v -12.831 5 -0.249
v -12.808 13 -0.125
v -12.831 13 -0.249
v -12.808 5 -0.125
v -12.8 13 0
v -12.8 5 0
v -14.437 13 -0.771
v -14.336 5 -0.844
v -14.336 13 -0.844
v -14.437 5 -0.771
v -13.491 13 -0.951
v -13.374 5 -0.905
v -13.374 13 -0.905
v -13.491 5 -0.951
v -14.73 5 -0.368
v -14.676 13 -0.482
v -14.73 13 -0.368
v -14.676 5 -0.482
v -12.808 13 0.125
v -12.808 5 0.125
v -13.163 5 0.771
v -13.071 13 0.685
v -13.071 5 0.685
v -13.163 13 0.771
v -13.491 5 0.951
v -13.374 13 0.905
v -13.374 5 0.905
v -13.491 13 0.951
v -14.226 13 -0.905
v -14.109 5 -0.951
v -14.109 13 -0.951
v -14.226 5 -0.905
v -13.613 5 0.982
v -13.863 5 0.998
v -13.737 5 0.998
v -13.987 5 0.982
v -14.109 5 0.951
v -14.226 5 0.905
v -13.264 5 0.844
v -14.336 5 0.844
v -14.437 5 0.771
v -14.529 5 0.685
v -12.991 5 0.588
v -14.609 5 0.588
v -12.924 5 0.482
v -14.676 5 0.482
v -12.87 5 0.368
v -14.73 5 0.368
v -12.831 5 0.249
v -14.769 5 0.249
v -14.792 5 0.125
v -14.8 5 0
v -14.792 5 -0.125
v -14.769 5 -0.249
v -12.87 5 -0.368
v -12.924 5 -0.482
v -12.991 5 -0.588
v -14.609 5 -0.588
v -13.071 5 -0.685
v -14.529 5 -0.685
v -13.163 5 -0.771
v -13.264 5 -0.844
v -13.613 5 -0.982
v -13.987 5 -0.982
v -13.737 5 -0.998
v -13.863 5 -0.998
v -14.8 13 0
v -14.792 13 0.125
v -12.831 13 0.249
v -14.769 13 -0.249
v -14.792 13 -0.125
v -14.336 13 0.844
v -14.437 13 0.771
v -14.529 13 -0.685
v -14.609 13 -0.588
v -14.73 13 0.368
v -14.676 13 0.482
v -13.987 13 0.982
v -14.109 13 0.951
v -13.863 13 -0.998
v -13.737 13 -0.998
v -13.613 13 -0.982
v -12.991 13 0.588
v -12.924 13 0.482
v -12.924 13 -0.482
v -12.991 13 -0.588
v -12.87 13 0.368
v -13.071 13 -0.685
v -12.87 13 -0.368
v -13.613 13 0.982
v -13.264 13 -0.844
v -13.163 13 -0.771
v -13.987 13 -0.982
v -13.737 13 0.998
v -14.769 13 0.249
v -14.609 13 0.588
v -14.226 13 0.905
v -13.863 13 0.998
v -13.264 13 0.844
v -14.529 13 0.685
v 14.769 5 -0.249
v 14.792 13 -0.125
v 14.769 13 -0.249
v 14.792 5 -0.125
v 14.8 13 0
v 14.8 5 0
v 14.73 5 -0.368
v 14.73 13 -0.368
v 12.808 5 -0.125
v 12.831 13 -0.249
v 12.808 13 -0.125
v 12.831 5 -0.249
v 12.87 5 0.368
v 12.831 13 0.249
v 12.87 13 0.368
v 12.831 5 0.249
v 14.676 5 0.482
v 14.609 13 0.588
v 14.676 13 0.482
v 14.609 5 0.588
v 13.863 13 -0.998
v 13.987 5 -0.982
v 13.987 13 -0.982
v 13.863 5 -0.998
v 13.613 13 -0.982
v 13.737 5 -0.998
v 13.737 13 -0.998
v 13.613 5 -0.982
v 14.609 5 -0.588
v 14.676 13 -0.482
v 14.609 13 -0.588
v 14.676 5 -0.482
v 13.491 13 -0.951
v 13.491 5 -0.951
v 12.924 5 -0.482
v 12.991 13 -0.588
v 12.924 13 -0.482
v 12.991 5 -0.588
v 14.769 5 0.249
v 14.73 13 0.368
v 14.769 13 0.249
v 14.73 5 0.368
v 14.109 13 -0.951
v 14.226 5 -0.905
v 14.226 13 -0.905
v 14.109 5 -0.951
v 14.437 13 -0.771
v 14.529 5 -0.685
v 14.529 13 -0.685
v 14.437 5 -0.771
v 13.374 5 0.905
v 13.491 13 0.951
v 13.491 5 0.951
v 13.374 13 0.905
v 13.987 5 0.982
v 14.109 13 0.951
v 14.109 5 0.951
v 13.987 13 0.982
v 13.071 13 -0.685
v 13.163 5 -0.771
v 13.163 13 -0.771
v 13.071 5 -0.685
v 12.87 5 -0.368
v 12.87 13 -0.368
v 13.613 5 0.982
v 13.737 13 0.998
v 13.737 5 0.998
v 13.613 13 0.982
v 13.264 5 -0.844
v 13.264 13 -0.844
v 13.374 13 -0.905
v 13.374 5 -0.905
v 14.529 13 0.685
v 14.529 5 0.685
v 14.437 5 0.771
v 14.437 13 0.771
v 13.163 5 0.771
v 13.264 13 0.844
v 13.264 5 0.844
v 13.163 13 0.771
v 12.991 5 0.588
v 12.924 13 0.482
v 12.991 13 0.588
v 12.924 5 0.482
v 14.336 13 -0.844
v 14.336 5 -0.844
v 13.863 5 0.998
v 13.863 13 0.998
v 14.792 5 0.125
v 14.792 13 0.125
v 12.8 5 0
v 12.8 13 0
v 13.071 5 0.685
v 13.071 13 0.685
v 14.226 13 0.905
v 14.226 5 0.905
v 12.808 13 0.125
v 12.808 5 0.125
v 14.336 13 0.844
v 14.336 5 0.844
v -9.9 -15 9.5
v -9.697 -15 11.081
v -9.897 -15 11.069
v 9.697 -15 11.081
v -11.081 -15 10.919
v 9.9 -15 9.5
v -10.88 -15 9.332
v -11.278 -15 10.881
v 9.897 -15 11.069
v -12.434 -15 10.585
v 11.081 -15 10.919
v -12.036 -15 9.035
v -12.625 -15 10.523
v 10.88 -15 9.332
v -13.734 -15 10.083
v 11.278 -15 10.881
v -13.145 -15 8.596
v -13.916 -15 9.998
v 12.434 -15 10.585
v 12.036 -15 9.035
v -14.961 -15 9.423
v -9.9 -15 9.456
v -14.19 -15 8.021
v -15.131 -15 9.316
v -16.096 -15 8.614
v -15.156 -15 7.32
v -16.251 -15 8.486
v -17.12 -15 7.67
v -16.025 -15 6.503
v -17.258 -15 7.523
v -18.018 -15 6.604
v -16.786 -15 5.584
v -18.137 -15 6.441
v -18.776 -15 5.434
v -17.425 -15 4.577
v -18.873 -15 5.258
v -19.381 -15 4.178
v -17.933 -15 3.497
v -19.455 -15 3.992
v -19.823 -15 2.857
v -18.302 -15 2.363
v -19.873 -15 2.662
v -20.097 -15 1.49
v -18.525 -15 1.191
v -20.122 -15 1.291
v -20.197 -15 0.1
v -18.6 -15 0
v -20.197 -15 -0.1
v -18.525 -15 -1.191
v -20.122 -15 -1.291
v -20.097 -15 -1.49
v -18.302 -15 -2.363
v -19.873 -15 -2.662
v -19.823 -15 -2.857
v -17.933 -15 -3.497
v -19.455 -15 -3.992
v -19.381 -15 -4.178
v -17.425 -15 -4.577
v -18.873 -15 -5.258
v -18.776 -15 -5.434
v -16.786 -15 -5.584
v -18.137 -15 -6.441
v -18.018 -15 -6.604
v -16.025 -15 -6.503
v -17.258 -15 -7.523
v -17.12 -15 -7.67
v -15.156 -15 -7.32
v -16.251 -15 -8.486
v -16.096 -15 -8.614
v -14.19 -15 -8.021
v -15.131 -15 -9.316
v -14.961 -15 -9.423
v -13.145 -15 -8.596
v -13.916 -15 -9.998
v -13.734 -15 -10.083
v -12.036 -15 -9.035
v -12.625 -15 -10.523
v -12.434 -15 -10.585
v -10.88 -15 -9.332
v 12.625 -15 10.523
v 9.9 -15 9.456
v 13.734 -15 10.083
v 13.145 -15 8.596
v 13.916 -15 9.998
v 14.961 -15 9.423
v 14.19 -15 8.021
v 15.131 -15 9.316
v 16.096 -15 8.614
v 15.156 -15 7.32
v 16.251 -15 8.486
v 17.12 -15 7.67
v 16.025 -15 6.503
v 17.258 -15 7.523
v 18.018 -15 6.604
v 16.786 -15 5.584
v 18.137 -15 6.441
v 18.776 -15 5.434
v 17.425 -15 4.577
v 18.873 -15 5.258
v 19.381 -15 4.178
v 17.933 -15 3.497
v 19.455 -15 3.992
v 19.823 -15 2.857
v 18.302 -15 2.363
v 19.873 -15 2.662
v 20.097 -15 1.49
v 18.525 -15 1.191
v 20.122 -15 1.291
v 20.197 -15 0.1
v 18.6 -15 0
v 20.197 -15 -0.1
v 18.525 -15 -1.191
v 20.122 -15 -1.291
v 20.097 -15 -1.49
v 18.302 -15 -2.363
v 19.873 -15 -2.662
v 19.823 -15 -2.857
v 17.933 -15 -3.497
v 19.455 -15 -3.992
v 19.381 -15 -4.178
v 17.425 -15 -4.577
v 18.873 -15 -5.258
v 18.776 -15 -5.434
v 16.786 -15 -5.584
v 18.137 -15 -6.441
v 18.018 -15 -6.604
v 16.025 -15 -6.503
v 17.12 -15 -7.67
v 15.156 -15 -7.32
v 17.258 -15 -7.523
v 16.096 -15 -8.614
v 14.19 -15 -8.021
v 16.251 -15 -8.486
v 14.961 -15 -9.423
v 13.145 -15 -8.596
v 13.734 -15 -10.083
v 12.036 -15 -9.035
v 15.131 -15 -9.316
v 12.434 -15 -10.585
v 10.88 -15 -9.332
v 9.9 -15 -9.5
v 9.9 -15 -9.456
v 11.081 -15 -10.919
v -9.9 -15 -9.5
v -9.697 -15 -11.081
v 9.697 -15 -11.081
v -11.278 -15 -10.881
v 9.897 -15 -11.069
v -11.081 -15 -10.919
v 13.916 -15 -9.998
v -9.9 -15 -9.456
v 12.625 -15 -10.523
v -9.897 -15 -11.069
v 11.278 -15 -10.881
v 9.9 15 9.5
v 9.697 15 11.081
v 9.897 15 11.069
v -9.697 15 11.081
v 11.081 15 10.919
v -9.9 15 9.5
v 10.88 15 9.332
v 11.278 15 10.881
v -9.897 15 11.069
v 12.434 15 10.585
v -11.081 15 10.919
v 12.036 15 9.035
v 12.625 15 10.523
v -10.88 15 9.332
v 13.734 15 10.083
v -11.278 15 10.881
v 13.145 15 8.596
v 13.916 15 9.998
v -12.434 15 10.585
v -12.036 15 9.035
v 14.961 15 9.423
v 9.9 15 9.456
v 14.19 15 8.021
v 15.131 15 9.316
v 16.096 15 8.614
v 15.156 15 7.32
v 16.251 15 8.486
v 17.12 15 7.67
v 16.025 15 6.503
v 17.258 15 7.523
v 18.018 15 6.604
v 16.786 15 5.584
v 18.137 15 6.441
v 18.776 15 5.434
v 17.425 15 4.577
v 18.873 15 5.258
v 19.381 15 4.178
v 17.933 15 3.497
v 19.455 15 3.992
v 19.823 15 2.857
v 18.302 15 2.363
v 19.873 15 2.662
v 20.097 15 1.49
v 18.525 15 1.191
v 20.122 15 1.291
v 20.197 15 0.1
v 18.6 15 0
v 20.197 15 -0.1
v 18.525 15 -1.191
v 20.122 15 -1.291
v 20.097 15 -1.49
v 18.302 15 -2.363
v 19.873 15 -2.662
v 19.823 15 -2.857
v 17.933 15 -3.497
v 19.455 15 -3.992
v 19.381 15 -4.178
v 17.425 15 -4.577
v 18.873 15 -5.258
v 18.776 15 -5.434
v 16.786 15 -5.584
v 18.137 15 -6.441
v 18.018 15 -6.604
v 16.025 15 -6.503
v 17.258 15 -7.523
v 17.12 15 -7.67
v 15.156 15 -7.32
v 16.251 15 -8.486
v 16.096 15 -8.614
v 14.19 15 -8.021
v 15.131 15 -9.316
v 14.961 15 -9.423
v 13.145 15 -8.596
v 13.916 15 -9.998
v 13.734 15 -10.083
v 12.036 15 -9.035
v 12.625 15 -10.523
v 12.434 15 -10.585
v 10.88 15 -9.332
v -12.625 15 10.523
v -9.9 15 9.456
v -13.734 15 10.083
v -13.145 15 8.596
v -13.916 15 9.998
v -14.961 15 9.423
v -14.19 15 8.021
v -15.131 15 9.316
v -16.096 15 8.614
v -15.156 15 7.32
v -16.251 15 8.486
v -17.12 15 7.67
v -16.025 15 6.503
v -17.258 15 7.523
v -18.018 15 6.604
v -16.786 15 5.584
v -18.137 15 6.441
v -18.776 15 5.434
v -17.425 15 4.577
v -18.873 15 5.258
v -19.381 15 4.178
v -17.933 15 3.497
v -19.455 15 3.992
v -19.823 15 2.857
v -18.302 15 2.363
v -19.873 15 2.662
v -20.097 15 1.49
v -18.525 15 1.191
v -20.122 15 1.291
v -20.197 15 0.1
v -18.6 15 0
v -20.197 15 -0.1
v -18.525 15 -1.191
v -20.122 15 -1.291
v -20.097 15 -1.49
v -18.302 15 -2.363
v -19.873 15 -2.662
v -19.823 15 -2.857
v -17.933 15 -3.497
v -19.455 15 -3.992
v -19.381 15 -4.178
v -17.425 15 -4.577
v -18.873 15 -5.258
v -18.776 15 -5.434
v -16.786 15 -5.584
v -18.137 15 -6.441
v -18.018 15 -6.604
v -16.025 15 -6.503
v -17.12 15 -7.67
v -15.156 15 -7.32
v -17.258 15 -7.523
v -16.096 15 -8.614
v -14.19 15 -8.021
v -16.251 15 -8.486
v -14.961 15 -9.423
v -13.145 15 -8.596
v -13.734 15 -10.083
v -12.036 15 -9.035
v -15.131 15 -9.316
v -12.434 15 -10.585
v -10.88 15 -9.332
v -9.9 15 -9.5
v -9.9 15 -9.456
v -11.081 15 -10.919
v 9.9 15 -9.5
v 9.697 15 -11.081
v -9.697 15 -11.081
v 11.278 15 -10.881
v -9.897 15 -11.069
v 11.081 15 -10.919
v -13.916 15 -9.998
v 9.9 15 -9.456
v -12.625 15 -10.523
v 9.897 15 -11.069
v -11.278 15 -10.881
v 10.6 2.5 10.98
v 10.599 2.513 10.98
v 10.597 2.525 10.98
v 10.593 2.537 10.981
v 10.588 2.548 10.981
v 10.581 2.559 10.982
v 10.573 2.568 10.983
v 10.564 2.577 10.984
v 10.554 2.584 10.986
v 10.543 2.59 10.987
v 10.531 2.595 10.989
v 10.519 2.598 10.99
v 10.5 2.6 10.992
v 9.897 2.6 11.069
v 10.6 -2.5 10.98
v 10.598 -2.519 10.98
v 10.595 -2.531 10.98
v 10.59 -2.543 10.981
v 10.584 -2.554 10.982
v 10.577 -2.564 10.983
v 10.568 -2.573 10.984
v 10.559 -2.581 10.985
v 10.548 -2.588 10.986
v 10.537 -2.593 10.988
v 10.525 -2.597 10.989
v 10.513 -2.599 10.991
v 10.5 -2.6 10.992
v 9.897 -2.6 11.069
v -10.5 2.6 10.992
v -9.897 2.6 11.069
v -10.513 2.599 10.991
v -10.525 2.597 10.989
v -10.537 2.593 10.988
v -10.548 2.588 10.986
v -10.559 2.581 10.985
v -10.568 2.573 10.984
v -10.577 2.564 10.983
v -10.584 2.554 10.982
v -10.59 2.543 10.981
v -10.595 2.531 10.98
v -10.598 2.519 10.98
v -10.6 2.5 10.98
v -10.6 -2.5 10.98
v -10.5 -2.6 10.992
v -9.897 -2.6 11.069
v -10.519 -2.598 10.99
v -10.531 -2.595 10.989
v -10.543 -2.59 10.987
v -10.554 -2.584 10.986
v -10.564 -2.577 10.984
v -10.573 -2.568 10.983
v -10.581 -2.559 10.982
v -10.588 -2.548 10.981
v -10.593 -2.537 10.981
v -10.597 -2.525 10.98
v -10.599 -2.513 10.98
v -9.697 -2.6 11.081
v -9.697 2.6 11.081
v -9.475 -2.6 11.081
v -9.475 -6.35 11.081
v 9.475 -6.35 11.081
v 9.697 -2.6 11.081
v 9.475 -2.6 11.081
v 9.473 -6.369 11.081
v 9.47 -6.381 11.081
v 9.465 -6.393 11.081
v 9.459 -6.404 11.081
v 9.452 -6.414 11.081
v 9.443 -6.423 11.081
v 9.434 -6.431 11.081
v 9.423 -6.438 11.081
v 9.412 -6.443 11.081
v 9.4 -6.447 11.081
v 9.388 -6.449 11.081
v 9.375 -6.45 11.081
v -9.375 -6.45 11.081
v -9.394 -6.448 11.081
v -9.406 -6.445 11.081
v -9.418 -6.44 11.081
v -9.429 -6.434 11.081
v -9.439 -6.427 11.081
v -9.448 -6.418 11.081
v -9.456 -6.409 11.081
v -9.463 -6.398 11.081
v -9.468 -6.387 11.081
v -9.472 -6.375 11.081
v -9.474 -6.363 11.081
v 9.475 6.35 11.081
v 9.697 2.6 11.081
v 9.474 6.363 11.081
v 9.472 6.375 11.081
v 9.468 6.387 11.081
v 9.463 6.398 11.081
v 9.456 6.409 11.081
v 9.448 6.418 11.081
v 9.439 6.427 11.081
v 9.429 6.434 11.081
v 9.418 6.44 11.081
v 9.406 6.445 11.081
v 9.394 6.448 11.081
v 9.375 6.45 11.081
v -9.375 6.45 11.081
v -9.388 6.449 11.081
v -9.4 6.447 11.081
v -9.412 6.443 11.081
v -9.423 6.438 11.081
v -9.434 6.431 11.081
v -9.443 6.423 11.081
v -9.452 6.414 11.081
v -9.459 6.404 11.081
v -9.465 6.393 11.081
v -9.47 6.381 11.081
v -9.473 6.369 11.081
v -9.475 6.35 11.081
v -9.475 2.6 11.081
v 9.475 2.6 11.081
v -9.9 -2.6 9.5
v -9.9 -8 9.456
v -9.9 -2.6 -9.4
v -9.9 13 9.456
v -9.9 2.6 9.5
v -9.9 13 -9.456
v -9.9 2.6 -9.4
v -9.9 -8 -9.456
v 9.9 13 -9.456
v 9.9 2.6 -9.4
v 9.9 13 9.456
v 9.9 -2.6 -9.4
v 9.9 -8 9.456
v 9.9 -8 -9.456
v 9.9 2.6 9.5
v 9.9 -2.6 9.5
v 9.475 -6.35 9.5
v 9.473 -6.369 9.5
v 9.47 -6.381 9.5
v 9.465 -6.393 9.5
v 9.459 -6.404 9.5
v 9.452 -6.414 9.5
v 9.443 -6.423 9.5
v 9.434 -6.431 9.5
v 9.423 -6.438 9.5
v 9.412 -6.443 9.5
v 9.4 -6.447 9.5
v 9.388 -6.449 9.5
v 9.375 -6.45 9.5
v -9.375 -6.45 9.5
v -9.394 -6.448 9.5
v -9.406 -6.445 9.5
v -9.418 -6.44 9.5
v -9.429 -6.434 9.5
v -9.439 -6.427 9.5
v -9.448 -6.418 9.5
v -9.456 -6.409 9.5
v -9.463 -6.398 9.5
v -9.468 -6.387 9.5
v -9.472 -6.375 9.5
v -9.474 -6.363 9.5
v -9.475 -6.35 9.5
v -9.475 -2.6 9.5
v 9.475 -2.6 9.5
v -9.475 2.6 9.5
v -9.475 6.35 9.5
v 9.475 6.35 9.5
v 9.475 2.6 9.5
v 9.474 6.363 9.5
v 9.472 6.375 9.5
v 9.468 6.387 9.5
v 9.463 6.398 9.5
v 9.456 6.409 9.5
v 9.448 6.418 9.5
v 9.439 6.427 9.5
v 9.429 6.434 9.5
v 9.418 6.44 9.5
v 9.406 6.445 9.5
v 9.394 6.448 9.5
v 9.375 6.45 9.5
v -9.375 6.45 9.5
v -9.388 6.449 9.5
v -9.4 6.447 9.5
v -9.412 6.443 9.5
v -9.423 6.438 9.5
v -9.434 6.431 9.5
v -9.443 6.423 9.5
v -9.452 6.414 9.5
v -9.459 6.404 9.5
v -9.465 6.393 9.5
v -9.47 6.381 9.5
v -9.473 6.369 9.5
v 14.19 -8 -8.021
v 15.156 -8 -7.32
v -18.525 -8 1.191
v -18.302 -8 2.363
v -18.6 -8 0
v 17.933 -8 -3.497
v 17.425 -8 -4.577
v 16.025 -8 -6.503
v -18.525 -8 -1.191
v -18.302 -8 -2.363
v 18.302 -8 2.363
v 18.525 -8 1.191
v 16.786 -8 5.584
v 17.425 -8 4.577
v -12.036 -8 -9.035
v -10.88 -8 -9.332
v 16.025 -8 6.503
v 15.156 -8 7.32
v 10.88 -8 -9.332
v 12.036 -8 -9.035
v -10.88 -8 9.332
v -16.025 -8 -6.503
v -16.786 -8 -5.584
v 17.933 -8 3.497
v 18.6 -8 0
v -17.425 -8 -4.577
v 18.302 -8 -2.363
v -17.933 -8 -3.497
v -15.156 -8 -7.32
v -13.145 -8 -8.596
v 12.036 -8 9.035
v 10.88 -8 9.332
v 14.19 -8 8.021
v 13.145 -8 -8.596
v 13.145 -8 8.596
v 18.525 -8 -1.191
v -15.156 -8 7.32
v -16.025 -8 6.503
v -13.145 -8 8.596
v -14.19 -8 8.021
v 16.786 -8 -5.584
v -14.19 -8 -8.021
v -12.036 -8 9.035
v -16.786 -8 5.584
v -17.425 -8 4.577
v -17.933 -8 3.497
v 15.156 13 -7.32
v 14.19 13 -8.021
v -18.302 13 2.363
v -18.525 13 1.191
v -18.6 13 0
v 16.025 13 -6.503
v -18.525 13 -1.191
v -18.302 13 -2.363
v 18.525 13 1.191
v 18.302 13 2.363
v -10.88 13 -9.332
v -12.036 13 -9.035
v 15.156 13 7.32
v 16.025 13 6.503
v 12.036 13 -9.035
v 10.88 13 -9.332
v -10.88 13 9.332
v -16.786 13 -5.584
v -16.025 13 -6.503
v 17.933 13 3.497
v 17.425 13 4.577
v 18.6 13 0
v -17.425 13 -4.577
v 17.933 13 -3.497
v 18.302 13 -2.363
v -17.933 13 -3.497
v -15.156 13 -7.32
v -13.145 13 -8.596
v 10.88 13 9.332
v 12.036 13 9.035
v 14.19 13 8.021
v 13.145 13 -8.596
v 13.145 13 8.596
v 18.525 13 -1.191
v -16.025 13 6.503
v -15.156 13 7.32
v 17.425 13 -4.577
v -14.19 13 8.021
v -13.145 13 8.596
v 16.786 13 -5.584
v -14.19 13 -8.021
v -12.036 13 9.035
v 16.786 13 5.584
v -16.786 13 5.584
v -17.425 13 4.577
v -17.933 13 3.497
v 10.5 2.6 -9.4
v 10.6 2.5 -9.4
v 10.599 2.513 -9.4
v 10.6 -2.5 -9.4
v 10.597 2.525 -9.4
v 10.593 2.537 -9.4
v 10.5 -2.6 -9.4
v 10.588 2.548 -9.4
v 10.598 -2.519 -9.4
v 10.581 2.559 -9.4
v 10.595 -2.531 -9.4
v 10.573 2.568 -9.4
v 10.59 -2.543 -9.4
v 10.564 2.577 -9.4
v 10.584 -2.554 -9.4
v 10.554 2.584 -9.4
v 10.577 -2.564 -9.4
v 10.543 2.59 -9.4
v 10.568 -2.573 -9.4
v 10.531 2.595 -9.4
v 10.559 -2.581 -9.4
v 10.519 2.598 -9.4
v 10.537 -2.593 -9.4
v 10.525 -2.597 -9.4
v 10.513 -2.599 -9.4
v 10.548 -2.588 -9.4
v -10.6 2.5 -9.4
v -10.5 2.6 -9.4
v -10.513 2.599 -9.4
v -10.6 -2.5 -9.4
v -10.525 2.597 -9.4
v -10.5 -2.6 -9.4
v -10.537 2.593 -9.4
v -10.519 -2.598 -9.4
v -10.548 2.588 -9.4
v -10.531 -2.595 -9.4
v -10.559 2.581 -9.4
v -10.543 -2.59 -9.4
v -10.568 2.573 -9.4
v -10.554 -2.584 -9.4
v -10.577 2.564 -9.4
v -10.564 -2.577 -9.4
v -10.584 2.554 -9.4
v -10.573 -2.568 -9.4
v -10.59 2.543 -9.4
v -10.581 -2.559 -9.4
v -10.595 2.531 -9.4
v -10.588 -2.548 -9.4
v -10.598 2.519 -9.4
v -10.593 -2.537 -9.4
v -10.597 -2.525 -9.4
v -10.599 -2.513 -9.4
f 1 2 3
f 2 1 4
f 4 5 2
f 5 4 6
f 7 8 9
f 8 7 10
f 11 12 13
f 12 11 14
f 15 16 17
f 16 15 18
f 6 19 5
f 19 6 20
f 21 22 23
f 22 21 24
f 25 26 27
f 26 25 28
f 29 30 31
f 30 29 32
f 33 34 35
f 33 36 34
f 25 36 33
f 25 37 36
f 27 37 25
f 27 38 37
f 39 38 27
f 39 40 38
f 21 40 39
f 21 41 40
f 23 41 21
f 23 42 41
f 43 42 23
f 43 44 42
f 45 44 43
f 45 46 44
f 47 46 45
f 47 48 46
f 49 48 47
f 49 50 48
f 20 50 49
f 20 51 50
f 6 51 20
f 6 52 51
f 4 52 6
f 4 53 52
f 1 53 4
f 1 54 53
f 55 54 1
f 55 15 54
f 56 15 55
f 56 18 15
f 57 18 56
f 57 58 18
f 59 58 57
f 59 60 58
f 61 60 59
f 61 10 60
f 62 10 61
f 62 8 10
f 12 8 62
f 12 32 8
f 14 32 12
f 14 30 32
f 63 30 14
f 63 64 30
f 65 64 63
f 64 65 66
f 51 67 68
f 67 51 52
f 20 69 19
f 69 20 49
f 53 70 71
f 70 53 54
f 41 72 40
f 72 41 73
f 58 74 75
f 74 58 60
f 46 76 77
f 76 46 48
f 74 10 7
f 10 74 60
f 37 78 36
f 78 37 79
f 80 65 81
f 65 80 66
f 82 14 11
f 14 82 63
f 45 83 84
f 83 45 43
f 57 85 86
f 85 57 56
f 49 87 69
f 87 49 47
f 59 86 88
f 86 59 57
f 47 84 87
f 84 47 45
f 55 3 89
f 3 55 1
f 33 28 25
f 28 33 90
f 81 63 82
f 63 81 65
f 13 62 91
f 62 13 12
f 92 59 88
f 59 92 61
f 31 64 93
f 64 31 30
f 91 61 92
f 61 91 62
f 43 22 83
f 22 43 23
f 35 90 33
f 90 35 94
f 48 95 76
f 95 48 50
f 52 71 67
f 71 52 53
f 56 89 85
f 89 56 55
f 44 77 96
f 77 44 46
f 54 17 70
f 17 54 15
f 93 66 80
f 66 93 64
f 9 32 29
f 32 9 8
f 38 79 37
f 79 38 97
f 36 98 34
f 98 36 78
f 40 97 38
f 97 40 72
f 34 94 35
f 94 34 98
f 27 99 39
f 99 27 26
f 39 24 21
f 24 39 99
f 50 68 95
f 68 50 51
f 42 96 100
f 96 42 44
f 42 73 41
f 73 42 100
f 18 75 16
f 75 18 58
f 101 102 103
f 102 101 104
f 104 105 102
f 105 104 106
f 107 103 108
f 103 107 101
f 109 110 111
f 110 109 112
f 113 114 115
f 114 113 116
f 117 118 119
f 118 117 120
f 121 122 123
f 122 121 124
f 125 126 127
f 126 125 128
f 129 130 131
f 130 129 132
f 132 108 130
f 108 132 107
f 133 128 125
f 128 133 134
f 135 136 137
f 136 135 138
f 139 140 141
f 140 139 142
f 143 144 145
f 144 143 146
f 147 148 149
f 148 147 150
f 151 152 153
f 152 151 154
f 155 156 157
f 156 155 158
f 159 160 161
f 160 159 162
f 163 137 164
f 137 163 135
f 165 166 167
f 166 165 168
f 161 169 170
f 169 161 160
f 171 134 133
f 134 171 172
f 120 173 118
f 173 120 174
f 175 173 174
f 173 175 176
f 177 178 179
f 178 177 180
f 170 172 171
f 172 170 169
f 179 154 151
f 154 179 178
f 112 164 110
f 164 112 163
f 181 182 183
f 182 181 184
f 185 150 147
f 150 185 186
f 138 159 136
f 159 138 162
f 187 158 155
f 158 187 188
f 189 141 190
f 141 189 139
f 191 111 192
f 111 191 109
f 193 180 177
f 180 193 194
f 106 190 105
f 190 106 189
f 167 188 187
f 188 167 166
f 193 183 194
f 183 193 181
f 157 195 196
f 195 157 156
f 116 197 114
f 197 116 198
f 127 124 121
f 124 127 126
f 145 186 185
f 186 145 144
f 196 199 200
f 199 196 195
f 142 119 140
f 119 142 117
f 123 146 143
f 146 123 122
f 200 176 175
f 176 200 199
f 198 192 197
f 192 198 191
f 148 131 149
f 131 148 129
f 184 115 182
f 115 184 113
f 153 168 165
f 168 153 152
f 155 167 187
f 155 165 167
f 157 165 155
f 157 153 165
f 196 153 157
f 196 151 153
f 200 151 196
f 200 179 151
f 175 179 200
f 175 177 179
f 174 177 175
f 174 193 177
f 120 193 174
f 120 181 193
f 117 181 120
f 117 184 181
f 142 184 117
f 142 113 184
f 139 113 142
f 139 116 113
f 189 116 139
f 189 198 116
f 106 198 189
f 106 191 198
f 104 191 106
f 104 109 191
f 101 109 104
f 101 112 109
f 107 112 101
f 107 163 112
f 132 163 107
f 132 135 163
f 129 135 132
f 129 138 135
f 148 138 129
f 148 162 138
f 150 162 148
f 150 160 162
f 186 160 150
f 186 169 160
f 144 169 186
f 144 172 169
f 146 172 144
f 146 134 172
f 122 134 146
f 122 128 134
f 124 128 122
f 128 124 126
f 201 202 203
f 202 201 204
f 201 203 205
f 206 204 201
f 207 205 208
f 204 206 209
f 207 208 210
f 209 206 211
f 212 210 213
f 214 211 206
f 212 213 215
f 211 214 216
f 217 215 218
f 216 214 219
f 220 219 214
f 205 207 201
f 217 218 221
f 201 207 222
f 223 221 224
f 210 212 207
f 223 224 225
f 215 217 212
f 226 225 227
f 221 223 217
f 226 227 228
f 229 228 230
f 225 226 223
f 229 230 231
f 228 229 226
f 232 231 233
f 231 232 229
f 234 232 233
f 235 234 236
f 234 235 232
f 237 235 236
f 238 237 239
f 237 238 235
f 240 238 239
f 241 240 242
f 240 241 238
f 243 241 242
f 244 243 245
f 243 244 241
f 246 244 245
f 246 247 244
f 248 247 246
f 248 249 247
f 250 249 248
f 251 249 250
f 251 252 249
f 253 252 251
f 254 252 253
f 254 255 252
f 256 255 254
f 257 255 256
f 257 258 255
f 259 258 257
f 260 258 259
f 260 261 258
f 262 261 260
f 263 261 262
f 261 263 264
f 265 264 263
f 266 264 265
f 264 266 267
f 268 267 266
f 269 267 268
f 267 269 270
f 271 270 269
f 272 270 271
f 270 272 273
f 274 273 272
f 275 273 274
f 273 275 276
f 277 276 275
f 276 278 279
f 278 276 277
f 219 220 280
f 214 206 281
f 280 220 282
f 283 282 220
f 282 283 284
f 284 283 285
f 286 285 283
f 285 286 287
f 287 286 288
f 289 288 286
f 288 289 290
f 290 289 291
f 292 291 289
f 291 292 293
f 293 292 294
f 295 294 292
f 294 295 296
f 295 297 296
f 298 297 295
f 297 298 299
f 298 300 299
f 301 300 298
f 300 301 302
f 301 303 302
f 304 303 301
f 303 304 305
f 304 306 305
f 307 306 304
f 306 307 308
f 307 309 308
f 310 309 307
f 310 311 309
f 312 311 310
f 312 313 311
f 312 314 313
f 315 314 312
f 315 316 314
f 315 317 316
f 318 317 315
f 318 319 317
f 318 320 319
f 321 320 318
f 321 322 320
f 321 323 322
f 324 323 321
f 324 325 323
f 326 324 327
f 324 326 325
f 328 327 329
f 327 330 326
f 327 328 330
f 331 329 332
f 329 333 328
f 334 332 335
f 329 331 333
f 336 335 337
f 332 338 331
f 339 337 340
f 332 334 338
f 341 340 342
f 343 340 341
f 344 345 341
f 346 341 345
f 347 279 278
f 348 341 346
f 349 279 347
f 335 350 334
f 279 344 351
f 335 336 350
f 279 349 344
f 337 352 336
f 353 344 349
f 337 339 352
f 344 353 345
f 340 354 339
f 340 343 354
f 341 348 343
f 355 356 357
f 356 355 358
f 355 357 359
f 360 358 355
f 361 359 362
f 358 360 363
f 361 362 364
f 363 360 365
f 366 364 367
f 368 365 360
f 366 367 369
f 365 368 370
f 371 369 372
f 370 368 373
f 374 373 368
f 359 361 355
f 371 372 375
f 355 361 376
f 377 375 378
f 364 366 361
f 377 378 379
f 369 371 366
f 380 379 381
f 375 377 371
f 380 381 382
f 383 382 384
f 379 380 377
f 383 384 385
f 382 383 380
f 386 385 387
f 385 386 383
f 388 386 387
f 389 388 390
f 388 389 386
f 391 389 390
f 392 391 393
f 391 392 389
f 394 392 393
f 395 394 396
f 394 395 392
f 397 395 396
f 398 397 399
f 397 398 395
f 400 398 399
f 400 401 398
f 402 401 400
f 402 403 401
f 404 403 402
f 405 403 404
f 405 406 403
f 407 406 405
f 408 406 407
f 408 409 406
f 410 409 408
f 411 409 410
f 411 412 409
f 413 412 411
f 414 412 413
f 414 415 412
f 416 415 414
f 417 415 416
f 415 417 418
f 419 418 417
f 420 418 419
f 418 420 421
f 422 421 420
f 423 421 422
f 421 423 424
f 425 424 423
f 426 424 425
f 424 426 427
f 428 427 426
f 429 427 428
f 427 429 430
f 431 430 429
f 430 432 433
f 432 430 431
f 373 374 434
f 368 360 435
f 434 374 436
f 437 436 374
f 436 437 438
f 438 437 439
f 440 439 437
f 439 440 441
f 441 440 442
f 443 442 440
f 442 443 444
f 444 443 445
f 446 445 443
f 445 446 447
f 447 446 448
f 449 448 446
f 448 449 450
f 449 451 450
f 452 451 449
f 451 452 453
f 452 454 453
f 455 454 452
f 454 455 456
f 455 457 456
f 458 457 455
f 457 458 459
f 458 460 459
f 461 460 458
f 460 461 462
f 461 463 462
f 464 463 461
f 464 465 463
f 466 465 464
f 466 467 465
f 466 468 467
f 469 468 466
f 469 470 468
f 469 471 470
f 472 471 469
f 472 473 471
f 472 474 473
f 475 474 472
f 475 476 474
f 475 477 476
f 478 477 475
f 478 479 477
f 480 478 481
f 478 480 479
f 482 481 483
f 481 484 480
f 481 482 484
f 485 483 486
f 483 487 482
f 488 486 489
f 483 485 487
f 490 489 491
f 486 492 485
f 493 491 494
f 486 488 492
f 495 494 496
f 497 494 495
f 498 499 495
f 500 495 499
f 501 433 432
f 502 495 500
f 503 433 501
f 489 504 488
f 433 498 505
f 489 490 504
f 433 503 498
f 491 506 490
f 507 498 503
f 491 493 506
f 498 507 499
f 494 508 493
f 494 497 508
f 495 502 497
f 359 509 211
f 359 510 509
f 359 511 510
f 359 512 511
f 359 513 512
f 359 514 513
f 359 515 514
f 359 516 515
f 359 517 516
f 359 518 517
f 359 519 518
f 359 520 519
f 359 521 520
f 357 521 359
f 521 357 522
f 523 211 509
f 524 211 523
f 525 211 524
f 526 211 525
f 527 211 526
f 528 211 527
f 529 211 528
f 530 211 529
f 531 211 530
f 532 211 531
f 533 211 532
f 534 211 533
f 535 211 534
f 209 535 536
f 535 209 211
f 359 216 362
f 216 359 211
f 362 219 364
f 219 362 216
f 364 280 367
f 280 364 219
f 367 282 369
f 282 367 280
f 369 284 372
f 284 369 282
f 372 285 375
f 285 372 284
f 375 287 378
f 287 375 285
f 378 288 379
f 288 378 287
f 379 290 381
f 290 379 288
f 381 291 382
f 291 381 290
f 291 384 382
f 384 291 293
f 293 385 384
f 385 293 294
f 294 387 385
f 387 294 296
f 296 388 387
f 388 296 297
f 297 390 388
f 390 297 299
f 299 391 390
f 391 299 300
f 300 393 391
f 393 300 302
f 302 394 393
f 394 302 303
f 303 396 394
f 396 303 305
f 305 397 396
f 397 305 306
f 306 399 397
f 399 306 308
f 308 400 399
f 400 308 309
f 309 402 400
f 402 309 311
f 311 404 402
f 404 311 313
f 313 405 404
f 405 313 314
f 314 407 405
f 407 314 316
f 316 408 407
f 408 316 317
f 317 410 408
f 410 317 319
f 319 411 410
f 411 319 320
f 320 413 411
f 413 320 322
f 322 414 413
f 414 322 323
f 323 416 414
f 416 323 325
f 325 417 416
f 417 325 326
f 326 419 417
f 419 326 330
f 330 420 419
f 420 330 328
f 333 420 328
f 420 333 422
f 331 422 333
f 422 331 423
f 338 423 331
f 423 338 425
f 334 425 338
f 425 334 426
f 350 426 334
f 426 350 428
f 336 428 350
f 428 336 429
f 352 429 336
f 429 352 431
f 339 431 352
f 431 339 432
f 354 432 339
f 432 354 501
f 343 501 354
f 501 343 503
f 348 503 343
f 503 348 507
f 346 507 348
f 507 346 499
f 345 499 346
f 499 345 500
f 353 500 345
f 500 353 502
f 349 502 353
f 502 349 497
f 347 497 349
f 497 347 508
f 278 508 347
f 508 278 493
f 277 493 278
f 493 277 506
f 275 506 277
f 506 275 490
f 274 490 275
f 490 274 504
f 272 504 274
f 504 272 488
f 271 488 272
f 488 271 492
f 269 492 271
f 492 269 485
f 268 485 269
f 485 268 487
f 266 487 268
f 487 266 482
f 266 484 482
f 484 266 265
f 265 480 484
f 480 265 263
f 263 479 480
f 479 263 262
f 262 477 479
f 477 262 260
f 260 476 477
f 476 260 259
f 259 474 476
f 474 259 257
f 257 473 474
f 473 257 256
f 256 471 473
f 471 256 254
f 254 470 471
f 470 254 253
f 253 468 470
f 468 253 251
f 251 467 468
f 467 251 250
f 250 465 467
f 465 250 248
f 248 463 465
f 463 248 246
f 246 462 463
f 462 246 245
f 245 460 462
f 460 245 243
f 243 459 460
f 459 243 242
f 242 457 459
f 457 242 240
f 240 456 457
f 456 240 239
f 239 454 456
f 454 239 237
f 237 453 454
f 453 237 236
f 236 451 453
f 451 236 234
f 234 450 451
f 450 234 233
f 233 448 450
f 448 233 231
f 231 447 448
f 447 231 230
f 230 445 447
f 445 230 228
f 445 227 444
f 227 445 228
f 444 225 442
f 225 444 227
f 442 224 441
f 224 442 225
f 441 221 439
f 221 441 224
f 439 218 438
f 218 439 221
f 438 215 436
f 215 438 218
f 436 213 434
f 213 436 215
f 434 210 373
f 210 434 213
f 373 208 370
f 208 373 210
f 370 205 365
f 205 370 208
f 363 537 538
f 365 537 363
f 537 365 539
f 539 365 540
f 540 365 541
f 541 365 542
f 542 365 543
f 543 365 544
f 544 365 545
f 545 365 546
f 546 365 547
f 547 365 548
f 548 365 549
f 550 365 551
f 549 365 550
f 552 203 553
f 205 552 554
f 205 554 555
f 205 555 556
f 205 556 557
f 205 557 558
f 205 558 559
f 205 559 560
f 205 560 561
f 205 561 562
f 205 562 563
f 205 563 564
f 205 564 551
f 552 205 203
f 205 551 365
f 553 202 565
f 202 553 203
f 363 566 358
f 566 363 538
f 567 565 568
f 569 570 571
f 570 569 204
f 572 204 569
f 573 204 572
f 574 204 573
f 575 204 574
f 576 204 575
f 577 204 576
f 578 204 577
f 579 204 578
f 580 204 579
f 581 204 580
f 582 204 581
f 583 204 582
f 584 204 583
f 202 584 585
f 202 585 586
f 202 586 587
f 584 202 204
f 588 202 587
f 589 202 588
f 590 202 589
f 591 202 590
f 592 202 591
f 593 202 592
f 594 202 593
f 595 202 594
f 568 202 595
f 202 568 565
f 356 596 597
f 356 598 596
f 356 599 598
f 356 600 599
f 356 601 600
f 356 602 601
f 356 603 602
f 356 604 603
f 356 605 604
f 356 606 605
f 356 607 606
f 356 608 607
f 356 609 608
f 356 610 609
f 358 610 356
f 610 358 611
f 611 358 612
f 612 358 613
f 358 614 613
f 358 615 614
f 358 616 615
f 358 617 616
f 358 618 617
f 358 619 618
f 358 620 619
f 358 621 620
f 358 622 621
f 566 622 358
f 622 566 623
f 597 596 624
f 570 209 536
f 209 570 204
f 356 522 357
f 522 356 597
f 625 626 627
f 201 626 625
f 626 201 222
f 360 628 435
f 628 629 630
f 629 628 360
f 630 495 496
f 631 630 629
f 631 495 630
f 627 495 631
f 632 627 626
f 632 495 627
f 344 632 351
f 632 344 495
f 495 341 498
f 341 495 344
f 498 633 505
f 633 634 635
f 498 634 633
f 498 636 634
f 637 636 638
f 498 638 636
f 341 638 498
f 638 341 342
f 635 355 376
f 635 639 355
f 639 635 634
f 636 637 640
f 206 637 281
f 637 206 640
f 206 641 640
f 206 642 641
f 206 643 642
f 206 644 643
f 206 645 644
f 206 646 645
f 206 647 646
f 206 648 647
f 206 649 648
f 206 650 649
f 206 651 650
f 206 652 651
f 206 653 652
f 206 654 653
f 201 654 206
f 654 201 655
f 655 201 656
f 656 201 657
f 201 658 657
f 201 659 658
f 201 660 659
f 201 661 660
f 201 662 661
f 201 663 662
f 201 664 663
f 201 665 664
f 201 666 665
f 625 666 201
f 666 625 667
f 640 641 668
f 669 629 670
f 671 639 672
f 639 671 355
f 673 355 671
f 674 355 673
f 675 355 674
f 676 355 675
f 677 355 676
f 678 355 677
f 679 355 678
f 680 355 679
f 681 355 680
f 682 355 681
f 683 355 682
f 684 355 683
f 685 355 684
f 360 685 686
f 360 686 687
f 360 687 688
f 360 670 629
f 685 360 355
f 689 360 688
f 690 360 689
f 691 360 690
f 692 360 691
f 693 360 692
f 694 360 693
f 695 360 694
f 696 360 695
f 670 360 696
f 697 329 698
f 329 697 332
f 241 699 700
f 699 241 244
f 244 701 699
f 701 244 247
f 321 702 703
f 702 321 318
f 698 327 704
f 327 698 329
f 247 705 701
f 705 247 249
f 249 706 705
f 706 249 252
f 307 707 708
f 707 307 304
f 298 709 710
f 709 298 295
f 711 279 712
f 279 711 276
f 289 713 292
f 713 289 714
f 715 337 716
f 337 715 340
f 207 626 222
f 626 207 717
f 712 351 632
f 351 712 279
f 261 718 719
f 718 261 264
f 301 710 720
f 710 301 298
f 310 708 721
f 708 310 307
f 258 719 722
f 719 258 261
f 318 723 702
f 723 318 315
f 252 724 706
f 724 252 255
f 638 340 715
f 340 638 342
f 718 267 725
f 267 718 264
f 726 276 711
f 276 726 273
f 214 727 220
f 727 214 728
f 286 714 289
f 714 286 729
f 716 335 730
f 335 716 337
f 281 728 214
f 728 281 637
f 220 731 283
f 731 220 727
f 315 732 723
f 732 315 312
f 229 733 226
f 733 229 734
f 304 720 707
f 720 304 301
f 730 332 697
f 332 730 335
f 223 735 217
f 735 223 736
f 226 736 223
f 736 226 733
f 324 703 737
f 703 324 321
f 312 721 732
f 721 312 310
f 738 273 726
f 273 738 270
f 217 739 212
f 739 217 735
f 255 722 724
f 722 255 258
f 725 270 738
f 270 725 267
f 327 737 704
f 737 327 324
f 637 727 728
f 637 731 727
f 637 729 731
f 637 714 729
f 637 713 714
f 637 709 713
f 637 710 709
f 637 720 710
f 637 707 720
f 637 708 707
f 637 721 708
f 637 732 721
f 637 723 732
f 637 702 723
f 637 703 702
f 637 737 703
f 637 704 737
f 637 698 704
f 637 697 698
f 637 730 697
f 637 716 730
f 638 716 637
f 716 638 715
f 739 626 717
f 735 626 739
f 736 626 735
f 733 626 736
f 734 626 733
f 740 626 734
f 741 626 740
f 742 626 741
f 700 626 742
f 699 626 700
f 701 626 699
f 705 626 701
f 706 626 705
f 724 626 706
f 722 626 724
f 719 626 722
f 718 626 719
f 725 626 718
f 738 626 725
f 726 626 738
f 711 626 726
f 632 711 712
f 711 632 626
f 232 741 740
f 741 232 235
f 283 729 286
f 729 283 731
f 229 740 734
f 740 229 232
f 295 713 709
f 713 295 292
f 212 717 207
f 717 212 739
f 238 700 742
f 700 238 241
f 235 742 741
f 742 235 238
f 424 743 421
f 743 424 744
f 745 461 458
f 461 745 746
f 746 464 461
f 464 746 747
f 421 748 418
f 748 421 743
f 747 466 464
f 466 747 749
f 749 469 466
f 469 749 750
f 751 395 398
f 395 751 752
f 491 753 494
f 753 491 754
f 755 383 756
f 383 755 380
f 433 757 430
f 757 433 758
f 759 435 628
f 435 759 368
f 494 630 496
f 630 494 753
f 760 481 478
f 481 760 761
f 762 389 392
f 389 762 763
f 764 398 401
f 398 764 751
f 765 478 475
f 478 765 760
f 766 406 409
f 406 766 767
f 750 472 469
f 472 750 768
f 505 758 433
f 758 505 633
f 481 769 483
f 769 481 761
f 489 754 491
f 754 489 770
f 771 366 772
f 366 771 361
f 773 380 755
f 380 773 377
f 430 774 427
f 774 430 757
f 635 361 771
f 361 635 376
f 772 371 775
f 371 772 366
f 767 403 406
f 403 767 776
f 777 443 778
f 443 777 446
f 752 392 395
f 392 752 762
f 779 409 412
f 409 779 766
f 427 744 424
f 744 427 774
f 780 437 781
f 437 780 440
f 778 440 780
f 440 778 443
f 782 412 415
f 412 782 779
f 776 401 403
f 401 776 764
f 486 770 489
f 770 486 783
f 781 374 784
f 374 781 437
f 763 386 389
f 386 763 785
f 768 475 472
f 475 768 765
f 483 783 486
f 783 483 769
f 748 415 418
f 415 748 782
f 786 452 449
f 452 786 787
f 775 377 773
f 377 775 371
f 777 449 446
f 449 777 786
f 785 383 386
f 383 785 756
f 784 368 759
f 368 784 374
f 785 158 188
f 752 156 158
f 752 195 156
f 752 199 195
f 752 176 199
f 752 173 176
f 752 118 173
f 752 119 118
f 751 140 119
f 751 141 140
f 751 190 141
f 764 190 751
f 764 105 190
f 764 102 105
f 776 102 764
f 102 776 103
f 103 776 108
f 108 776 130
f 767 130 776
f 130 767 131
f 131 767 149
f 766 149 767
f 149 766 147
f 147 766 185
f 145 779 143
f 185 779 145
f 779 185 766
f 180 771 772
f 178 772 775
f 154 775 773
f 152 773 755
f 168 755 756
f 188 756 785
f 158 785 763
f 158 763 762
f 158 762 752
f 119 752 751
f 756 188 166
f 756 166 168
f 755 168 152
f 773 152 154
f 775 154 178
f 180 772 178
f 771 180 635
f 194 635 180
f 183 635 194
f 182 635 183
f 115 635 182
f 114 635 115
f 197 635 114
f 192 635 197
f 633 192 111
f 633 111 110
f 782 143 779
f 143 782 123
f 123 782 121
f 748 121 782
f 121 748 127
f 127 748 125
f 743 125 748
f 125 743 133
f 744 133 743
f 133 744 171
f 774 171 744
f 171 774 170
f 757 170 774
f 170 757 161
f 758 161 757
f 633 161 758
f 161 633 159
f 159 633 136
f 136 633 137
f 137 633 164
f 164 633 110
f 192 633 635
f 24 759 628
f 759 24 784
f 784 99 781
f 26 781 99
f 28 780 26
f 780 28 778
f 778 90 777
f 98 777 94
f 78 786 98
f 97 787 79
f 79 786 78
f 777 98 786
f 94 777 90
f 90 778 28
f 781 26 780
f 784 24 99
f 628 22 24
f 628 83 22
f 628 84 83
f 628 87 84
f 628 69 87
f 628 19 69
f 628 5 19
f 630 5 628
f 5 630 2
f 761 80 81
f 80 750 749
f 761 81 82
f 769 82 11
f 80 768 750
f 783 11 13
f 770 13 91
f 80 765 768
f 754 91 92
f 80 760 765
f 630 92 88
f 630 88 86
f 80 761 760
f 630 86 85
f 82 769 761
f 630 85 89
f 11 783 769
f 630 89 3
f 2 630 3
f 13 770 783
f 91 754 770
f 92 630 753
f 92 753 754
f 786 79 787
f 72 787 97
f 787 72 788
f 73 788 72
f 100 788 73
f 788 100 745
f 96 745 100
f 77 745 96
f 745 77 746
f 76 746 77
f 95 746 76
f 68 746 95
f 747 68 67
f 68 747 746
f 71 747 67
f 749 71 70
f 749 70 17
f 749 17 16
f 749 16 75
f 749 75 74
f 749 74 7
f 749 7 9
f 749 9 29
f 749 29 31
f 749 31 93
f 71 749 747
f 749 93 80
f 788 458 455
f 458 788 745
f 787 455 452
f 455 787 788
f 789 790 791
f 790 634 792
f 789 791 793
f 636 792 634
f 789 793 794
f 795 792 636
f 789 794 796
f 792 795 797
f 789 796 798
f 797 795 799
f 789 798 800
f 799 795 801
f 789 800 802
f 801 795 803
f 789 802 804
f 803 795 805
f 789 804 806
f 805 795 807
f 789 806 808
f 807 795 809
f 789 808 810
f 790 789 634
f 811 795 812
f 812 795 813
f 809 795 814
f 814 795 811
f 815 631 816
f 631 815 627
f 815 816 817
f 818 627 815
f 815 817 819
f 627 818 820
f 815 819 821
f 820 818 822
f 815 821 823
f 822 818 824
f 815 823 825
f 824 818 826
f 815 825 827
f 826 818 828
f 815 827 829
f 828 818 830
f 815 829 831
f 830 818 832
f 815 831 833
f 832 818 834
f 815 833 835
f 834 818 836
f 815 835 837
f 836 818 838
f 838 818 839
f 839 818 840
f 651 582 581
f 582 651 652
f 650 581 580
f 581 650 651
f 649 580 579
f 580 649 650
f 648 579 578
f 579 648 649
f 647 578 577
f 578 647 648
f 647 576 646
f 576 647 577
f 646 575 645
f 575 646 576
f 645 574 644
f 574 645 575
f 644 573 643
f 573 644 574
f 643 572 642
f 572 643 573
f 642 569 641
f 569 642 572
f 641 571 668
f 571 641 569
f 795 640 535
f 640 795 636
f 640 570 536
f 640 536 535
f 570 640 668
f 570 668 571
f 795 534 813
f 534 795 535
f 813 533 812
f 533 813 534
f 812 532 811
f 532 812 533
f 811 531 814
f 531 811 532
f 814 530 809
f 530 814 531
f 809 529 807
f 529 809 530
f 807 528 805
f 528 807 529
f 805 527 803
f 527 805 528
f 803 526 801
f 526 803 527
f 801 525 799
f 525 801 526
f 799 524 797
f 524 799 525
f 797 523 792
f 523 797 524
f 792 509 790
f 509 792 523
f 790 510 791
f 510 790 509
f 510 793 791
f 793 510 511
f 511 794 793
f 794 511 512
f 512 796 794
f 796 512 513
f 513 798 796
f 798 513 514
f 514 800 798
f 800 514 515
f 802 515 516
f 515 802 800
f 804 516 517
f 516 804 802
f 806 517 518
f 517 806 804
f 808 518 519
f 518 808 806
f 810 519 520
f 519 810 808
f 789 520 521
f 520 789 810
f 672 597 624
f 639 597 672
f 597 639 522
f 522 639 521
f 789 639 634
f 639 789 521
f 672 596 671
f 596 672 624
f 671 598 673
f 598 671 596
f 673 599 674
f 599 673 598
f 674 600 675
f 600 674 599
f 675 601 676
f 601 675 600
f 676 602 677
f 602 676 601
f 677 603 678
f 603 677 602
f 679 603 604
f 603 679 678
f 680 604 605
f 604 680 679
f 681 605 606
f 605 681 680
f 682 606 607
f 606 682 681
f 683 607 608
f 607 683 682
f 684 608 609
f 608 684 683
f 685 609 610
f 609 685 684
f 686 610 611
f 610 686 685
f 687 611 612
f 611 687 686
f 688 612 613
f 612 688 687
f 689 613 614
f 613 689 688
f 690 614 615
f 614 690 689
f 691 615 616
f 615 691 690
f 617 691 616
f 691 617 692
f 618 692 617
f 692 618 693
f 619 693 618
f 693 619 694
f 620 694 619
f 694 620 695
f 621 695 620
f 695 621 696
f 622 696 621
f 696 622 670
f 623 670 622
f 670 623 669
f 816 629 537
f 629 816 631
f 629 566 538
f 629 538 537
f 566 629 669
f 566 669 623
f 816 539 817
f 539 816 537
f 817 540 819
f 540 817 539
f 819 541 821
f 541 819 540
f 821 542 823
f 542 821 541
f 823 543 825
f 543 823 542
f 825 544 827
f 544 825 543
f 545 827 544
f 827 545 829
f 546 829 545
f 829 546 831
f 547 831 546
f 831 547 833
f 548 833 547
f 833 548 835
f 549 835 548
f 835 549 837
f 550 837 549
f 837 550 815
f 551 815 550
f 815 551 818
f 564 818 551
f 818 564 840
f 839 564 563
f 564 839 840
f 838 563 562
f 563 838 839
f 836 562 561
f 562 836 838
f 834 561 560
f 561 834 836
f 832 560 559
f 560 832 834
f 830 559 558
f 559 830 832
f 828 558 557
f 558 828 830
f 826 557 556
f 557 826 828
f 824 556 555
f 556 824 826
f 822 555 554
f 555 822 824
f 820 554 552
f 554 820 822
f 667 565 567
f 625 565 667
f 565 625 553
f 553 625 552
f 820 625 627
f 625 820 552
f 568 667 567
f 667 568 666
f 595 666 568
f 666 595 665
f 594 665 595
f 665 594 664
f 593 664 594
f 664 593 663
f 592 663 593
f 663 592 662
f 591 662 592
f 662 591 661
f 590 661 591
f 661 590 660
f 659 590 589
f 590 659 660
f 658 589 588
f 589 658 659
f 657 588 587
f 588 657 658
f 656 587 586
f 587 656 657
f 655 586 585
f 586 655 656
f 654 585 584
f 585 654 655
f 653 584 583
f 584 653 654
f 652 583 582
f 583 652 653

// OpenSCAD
$fn=50;

dia=19;
width=37.2;
wallThck=1.6;
fudge=0.1;
spcng=0.1;

difference(){
  translate([0,-15,0]) rotate([-90,0,0]) shell();
  translate([0,0,-dia/2+fudge]) linear_extrude(dia+wallThck+fudge,convexity=5) 
    offset(spcng) projection(true) translate([0,0,fudge]) switch();
}
*translate([0,0,dia/2+wallThck]) switch();

module shell(){
  difference(){
    linear_extrude(30,convexity=5) difference(){
      offset(wallThck) hull() for (ix=[-1,1])
        translate([ix*(width-dia)/2,0]) circle(d=19);
      square([width-dia+wallThck,dia],true);
    }
    translate([0,0,-fudge]) linear_extrude(7+fudge) hull() for (ix=[-1,1])
        translate([ix*(width-dia)/2,0]) circle(d=19);
    translate([0,0,30-2]) linear_extrude(7+fudge) hull() for (ix=[-1,1])
        translate([ix*(width-dia)/2,0]) circle(d=19);
    for (ix=[-1,1])
      translate([ix*(width/2-wallThck*3),0,30-10]) cylinder(d=2,h=10);
  }
}


module switch(){
  color("darkSlateGrey"){
    translate([0,0,-13.5/2]) cube([18.75,12.7,13.5],true);
    translate([0,0,1]) cube([21,15,2],true);
    translate([0,0,-13.5/2]) cube([21,5,13.5],true);
  }
  color("silver") for (ix=[0,1])
    translate([ix*7.4,0,-6.9/2-13.5]) cube([0.7,4.9,6.9],true);
}
